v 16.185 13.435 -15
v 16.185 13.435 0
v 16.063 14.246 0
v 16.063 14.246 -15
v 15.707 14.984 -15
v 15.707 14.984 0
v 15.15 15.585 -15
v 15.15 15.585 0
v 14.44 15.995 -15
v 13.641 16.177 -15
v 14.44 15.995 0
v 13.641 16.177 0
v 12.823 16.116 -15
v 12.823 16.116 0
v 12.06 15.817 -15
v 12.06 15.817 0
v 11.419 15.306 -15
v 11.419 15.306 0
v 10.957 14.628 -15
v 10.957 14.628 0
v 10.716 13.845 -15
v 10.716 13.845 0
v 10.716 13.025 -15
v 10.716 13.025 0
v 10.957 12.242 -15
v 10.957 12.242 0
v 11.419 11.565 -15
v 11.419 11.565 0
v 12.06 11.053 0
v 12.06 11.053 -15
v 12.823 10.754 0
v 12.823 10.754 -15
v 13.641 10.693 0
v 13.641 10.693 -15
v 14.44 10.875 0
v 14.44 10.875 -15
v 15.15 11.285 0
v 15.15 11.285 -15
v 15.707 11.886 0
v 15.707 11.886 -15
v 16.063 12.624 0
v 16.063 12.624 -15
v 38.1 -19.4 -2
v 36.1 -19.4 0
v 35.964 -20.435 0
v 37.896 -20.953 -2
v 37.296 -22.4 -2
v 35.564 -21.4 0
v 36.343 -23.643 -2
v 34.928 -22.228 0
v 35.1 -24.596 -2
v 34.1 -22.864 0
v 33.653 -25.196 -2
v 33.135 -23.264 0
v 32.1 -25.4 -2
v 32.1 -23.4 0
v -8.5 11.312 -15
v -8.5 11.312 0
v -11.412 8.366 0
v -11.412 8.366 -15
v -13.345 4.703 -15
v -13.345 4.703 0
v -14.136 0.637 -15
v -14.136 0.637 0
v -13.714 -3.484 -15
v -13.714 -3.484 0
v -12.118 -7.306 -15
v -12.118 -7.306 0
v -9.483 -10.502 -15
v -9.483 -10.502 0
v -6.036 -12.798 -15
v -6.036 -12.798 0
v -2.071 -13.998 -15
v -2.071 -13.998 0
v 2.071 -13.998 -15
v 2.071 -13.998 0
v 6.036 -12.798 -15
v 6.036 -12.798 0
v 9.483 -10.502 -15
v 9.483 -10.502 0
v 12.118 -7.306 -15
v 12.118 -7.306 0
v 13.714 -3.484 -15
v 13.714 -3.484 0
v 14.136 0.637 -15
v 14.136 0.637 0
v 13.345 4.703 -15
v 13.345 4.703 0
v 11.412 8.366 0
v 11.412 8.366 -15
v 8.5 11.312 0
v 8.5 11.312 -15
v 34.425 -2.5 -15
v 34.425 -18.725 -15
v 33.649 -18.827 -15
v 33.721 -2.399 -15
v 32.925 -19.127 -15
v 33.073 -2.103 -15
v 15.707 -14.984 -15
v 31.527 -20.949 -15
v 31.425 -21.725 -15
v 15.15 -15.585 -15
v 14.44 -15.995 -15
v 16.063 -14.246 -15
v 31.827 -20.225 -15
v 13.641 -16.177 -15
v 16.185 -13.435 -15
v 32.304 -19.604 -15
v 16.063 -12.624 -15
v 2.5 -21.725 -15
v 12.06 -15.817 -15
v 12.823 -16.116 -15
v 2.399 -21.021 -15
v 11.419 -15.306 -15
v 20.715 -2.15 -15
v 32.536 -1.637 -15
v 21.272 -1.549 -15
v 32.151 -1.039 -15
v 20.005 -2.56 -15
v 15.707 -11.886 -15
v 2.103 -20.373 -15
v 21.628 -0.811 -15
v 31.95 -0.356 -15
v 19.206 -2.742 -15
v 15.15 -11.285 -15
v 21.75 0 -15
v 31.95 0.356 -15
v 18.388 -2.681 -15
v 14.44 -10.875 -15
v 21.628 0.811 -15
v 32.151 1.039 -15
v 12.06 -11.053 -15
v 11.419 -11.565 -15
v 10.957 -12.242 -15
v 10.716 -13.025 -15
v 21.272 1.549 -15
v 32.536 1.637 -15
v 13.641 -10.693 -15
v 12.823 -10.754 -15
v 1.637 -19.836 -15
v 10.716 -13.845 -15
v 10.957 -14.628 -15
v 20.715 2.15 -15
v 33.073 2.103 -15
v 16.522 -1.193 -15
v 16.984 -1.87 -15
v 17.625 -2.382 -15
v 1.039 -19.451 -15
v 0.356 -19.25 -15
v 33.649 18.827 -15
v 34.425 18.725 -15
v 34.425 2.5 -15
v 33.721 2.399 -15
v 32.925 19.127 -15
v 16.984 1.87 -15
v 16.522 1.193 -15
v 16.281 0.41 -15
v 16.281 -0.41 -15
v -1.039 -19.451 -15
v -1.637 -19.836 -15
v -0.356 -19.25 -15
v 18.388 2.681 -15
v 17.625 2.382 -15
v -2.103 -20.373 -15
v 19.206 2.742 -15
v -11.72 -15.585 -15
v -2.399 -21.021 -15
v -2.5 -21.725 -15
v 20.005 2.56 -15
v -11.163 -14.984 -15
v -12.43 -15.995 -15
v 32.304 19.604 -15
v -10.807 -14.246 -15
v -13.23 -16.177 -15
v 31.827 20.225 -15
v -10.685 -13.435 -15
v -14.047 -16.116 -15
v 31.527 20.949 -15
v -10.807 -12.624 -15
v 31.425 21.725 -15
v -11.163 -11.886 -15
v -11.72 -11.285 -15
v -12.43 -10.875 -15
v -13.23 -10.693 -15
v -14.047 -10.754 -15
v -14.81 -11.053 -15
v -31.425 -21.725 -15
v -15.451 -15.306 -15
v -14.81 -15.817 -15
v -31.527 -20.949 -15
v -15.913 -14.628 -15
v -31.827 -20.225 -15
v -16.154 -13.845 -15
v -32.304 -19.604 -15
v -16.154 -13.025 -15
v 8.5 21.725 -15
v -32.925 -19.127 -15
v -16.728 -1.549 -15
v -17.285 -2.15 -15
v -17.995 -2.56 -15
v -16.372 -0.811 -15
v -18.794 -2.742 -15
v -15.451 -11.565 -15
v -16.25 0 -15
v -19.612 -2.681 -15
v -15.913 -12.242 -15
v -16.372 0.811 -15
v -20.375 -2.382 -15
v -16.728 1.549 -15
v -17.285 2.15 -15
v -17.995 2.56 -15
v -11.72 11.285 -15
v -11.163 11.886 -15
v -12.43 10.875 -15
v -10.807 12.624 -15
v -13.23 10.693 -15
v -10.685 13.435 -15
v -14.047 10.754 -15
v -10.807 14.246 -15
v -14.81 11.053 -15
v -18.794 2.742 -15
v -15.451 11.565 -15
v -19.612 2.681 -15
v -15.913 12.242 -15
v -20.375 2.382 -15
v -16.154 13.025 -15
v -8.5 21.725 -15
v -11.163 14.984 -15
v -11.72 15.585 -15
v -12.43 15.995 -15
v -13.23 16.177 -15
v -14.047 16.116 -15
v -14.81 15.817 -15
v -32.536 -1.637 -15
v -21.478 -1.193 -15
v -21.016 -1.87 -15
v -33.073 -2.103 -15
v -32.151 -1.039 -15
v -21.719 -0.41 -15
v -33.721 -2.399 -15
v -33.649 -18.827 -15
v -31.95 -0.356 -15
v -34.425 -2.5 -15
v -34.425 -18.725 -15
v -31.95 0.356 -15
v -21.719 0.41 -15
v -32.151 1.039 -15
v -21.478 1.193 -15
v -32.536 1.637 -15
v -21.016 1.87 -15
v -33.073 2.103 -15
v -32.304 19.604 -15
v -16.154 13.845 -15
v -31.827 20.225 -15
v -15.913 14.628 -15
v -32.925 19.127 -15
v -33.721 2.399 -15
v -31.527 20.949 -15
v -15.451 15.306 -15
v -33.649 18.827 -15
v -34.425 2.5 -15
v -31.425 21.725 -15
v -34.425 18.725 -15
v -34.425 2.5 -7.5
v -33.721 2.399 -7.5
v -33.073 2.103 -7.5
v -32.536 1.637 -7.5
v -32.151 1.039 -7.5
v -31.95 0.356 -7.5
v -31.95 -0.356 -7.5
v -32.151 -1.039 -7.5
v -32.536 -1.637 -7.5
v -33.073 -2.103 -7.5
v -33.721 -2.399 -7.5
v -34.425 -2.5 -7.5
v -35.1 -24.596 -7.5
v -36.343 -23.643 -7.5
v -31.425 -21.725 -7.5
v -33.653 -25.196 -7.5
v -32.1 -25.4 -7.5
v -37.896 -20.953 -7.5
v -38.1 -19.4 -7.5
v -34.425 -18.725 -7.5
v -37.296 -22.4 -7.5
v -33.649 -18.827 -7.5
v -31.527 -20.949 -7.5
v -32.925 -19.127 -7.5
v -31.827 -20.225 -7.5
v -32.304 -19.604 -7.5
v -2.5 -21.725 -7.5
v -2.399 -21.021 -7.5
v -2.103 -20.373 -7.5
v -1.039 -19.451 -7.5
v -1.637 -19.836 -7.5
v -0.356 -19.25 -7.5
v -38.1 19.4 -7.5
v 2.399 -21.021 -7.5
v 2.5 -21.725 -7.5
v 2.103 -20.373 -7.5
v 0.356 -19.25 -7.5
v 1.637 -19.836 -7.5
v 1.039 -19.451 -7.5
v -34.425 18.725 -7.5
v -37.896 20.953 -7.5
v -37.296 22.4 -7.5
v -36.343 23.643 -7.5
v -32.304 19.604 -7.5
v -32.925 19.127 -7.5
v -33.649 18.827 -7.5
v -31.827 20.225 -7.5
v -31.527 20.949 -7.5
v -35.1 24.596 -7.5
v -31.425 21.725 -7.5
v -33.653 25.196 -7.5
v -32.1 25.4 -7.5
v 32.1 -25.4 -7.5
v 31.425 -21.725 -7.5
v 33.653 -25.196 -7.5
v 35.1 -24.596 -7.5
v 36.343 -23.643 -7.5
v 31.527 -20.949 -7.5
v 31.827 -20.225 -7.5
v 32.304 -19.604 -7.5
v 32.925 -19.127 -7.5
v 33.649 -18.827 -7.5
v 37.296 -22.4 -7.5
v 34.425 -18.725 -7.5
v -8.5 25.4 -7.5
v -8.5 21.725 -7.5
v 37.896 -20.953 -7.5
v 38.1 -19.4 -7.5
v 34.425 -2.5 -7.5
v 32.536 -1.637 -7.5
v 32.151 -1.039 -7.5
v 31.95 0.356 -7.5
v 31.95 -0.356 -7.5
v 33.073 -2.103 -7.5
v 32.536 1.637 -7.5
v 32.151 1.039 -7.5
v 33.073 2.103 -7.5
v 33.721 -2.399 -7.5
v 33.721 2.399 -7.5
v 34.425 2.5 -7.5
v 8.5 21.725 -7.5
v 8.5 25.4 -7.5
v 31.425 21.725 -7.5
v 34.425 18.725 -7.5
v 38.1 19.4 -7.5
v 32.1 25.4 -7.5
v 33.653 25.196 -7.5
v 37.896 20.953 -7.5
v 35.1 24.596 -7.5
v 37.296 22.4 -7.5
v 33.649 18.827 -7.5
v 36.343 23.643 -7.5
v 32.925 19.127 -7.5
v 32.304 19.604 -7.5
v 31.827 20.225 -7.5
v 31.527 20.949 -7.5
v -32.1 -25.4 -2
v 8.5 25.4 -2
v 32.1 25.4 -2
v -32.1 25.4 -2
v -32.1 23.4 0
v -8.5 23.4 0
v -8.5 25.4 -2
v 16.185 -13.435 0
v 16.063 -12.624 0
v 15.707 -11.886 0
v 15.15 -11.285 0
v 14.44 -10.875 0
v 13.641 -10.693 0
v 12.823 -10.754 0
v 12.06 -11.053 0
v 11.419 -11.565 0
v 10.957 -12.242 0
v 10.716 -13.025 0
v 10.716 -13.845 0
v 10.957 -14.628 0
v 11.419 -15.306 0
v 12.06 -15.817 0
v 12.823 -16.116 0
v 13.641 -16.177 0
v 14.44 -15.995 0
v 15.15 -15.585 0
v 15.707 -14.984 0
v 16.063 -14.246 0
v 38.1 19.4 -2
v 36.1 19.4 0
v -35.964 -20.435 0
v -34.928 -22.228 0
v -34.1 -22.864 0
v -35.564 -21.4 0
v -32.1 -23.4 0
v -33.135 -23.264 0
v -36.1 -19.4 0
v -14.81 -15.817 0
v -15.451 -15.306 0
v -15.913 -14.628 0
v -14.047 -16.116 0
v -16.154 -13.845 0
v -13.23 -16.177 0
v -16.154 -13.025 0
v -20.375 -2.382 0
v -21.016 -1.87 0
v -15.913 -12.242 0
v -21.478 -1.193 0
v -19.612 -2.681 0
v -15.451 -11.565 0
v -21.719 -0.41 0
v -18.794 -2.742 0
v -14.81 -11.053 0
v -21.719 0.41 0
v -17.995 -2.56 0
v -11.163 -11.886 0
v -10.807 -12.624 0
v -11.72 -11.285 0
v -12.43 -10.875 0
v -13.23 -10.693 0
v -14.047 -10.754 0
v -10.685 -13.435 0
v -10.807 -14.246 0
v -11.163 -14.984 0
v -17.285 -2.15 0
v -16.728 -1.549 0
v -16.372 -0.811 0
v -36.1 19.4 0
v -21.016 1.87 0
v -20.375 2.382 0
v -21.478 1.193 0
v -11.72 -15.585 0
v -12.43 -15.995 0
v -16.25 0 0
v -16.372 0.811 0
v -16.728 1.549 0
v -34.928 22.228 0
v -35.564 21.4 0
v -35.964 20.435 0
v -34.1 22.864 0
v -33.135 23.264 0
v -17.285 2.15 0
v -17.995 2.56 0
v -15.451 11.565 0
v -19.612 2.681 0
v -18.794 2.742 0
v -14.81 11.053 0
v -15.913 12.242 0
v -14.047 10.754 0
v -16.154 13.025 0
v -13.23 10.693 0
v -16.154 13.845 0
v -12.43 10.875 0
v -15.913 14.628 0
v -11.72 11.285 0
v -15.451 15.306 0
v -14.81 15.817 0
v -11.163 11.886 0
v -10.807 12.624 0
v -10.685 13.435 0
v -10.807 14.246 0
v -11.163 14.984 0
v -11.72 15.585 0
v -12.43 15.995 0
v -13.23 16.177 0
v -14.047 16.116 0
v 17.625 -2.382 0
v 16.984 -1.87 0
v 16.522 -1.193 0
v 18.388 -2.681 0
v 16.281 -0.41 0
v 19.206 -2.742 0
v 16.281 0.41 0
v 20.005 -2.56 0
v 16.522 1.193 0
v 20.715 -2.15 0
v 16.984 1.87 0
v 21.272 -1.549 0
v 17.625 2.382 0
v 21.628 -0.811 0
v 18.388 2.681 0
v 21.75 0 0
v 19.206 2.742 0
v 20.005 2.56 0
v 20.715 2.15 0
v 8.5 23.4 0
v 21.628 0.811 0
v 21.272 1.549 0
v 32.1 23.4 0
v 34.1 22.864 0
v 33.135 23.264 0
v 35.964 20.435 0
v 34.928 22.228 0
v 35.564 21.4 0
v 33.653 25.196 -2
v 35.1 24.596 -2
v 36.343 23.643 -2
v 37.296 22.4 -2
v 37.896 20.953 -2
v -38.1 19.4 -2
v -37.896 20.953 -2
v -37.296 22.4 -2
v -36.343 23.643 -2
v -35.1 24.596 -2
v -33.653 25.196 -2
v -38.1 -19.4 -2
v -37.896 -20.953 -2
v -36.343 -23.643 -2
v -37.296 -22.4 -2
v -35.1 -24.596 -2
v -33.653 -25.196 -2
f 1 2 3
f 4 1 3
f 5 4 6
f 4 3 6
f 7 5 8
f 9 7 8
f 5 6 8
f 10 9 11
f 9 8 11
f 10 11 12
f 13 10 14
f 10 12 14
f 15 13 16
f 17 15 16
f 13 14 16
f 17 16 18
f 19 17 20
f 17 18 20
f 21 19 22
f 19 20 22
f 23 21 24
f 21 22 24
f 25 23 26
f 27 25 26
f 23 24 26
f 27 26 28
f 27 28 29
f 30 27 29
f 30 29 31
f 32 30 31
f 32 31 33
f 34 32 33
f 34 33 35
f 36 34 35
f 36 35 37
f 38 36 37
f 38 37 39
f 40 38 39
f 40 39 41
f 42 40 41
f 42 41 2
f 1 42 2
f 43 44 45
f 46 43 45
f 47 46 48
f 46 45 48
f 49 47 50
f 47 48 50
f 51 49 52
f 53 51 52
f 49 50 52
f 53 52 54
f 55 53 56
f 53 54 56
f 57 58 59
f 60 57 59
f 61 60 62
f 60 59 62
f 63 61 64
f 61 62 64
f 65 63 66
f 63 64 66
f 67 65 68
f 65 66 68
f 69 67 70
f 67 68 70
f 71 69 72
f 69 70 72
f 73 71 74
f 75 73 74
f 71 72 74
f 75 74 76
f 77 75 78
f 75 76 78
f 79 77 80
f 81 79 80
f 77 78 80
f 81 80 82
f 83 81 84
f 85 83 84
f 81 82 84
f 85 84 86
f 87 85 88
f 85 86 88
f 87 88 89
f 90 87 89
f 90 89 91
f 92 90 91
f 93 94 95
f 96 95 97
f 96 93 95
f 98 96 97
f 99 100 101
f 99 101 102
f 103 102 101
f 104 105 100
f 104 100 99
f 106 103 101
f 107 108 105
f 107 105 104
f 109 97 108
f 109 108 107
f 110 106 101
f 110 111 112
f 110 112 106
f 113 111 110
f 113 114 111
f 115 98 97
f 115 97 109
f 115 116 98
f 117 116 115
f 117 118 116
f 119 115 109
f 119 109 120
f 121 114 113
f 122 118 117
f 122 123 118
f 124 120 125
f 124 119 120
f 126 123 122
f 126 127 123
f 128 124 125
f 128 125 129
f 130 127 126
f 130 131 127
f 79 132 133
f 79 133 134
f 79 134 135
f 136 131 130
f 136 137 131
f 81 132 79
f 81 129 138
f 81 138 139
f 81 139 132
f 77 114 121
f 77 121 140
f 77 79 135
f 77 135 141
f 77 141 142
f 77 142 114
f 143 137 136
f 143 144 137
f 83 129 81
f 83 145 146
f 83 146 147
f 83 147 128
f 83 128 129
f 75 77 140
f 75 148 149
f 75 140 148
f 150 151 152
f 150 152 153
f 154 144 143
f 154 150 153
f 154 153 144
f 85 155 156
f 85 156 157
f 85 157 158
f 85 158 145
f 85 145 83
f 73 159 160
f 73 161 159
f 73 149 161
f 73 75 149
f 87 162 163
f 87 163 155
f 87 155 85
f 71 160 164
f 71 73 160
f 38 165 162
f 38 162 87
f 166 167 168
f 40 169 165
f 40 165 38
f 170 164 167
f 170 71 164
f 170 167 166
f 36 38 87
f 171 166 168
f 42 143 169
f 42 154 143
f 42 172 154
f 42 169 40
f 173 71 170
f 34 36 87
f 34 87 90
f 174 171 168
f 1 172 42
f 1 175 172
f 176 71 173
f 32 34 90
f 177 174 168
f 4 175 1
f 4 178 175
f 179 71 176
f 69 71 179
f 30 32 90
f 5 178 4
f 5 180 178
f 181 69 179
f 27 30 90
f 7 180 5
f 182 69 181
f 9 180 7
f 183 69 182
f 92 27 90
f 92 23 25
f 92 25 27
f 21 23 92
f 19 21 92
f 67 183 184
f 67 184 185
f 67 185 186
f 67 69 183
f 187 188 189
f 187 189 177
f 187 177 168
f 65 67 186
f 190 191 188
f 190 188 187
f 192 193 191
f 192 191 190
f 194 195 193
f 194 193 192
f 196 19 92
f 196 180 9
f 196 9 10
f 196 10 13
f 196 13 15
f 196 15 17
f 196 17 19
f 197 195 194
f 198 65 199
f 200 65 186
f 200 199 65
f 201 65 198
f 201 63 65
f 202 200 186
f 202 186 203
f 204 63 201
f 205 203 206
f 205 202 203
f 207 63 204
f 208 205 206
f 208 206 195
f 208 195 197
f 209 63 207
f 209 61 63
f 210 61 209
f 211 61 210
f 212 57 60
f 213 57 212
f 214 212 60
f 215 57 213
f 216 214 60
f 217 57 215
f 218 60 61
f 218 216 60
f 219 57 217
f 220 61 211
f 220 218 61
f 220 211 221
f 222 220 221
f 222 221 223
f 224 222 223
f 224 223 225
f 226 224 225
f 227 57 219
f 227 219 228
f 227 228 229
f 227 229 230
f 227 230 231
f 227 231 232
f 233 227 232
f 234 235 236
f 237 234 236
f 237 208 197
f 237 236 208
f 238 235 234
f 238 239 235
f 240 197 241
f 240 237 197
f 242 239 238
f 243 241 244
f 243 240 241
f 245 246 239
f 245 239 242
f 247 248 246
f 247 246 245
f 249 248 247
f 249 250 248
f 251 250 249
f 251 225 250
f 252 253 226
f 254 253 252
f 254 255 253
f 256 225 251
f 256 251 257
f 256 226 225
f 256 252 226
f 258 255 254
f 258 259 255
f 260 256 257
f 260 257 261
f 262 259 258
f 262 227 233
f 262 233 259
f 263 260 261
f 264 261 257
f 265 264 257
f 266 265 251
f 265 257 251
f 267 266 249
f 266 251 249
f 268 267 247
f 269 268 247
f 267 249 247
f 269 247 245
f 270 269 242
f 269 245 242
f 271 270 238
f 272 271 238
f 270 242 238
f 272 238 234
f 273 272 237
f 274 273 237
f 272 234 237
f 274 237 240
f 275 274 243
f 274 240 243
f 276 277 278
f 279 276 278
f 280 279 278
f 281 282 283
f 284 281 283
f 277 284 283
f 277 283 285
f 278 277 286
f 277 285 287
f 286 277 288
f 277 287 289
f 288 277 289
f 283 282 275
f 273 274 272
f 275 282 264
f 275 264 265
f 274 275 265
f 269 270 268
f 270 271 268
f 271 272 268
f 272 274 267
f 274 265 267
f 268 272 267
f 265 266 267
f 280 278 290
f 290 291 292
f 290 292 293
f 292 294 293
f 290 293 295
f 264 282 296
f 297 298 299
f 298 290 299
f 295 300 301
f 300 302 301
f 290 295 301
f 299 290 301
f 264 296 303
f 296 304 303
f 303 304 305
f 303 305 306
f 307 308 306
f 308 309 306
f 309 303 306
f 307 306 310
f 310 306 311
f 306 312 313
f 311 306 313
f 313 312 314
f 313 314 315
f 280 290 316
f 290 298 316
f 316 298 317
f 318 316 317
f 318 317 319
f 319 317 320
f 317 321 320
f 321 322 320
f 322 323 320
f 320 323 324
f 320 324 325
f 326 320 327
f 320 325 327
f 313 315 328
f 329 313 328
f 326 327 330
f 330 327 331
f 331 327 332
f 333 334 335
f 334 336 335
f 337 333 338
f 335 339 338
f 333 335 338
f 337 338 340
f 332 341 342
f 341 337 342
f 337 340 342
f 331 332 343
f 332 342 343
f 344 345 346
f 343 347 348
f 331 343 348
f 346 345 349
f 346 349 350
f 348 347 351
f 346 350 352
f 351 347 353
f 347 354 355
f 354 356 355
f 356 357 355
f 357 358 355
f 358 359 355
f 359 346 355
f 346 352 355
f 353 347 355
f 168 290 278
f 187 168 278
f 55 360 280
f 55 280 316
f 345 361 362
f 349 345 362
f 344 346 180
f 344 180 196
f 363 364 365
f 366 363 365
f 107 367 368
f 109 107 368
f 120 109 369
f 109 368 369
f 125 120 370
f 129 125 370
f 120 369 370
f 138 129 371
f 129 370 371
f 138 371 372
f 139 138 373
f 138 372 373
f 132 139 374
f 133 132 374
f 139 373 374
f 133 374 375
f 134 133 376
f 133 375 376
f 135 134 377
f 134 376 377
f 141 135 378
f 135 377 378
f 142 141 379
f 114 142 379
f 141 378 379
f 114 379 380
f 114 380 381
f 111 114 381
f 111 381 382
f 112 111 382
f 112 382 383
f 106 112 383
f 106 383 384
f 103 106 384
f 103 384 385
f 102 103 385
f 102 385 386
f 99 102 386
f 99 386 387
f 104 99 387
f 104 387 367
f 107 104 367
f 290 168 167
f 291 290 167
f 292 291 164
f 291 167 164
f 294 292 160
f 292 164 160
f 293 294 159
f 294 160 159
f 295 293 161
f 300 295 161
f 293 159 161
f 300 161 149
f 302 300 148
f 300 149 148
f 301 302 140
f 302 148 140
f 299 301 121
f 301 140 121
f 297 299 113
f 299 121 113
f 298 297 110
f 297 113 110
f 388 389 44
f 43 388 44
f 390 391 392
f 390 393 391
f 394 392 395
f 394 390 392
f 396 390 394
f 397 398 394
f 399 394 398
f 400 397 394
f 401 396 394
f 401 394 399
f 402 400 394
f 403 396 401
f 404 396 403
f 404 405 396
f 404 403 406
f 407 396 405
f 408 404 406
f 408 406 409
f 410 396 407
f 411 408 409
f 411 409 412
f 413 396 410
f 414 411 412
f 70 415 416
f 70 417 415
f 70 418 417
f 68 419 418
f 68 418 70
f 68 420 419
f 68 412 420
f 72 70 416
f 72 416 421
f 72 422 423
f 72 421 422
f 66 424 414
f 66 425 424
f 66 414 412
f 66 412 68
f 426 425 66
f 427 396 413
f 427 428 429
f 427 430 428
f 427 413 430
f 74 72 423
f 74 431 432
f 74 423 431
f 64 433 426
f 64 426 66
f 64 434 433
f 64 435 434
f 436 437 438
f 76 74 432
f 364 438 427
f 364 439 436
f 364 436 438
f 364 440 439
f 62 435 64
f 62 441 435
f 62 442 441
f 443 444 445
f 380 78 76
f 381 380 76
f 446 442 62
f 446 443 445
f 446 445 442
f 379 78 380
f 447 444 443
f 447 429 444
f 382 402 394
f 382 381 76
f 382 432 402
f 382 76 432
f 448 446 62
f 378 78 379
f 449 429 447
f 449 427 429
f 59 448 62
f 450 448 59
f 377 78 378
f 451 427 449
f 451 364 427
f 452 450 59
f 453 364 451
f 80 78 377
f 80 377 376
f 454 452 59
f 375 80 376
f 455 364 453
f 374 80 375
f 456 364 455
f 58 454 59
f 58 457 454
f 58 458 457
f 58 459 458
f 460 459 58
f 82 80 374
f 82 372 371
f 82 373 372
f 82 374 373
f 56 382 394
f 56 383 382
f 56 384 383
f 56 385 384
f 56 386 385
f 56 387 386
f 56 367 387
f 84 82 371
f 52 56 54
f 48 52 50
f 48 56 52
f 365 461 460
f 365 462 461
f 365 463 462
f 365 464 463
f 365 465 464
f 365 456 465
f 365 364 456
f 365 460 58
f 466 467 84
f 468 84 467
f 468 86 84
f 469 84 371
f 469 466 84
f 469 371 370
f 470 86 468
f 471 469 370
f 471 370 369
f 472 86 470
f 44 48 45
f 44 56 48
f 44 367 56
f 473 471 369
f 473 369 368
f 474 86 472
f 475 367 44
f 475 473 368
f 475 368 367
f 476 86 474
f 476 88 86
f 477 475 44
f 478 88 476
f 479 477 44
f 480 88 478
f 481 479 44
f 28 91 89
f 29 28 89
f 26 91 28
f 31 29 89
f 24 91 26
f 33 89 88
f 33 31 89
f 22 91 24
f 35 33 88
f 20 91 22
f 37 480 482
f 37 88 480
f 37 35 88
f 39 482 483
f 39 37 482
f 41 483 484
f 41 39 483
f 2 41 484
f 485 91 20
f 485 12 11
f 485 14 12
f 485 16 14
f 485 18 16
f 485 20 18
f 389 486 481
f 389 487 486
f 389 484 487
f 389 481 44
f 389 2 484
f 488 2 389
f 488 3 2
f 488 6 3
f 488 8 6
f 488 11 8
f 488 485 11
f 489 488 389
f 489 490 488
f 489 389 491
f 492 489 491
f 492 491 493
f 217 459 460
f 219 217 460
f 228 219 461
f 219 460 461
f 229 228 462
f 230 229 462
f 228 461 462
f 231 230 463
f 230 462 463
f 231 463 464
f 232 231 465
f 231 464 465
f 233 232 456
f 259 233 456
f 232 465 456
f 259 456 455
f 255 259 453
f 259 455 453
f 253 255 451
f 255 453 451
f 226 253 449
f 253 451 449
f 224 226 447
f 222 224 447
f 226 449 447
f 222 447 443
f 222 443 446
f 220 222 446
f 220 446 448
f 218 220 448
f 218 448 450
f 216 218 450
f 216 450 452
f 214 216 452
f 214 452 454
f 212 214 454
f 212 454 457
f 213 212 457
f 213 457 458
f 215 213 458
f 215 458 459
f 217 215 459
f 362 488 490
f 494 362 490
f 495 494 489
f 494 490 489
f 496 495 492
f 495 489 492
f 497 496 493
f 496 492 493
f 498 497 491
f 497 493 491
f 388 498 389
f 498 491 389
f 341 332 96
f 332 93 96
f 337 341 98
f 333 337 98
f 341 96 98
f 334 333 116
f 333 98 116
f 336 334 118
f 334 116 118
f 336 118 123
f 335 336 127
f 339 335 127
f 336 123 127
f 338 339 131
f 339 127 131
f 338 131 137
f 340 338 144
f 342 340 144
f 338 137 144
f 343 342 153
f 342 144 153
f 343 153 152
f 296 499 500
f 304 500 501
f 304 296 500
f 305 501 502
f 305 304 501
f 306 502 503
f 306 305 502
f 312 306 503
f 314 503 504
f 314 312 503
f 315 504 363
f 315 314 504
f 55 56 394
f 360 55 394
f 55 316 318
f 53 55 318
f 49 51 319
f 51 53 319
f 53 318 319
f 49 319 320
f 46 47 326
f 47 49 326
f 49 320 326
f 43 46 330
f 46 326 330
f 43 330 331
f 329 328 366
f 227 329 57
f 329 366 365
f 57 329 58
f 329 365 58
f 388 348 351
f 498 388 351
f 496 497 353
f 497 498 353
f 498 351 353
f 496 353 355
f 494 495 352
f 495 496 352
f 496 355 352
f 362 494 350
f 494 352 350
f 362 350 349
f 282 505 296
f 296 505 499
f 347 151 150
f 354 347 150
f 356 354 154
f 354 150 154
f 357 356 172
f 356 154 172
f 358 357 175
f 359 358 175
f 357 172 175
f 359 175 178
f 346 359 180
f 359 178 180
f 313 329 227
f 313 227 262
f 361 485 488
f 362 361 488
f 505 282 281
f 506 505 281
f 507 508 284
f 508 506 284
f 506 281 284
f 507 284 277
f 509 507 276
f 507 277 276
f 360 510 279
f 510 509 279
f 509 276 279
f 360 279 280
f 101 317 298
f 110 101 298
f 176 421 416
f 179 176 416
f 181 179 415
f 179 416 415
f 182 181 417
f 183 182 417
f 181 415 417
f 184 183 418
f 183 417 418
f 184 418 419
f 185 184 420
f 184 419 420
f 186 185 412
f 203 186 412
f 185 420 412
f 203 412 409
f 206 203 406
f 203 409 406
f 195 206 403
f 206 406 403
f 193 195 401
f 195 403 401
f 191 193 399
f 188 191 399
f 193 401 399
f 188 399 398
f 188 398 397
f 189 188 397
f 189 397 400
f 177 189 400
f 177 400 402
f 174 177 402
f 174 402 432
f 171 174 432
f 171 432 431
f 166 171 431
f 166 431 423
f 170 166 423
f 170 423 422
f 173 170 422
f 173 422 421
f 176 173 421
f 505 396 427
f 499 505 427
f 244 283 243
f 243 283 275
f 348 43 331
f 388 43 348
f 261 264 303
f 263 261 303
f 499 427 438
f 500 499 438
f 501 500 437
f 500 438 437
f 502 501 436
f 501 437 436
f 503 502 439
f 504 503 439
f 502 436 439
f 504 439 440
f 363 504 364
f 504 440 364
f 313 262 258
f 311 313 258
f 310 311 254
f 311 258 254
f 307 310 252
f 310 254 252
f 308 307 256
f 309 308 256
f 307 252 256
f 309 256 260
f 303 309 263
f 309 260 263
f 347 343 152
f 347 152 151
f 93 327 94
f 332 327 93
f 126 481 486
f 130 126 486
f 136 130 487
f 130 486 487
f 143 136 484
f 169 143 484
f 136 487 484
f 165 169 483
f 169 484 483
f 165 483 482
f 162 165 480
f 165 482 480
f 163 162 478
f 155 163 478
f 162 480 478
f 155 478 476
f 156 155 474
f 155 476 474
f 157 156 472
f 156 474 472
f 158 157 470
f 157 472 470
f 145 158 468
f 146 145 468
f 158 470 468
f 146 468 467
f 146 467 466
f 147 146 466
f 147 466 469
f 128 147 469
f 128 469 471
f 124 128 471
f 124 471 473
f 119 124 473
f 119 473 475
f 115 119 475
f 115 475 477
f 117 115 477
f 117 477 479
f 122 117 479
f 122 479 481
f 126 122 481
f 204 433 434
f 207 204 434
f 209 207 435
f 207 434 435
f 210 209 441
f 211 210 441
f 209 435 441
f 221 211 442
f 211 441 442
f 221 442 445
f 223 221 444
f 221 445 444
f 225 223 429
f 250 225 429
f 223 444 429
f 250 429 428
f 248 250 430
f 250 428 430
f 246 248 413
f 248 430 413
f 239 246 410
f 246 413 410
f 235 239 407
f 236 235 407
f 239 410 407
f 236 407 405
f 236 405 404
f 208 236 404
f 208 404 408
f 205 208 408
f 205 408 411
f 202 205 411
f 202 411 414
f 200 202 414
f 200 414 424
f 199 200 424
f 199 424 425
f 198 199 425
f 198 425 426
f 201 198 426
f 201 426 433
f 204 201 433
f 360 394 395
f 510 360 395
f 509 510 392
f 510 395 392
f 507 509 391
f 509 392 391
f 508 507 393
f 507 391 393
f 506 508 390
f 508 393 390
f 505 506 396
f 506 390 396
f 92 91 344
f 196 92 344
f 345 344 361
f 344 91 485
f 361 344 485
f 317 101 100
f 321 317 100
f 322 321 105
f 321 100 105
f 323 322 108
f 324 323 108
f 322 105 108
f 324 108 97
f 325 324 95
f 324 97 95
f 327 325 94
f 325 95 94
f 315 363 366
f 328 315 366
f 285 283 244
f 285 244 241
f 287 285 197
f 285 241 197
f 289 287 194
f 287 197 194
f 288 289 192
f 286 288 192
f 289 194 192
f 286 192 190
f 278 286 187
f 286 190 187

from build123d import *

# Parameters (mm, degrees)
SKETCH1_W           = 76.2
SKETCH1_H           = 50.8
BOSS_EXTRUDE1_DEPTH = 7.5
SKETCH2_W           = 68.85
SKETCH2_H           = 43.45
BOSS_EXTRUDE2_DEPTH = 7.5
SKETCH3_R           = 2.75
CUT_EXTRUDE1_DEPTH  = 49.184748624
FILLET1_R           = 6
SKETCH4_R           = 3
SKETCH4_R_2         = 2.5
CUT_EXTRUDE2_DEPTH  = 7.5
CHAMFER1_SIZE       = 2


with BuildPart() as part:
    # Sketch1 → Boss-Extrude1 (new body)
    with BuildSketch(Plane.XY):
        Rectangle(SKETCH1_W, SKETCH1_H)
    extrude(amount=-BOSS_EXTRUDE1_DEPTH)

    # Sketch2 → Boss-Extrude2 (add)
    with BuildSketch(Plane(origin=(0, 0, -7.5), x_dir=(-1, 0, 0), z_dir=(0, 0, -1))):
        Rectangle(SKETCH2_W, SKETCH2_H)
    extrude(amount=BOSS_EXTRUDE2_DEPTH)

    # Sketch3 → Cut-Extrude1 (cut, through all)
    with BuildSketch(Plane.XY):
        with Locations((-19, 0)):
            Circle(SKETCH3_R)
        with Locations((-13.435028843, 13.435028843)):
            Circle(SKETCH3_R)
        with Locations((13.435028843, 13.435028843)):
            Circle(SKETCH3_R)
        with Locations((19, 0)):
            Circle(SKETCH3_R)
        with Locations((13.435028843, -13.435028843)):
            Circle(SKETCH3_R)
        with Locations((-13.435028843, -13.435028843)):
            Circle(SKETCH3_R)
        with BuildLine():
            Line((8.5, 11.312493094), (8.5, 25.4))
            Line((8.5, 25.4), (-8.5, 25.4))
            Line((-8.5, 25.4), (-8.5, 11.312493094))
            ThreePointArc((-8.5, 11.312493094), (0, -14.15), (8.5, 11.312493094))
        make_face()
    extrude(amount=-CUT_EXTRUDE1_DEPTH, mode=Mode.SUBTRACT)

    # Fillet1
    fillet1_edges = [part.edges().sort_by_distance(p)[0] for p in [
        (-38.1, 25.4, -3.75),
        (38.1, 25.4, -3.75),
        (38.1, -25.4, -3.75),
        (-38.1, -25.4, -3.75),
    ]]
    fillet(fillet1_edges, radius=FILLET1_R)

    # Sketch4 → Cut-Extrude2 (cut)
    with BuildSketch(Plane(origin=(0, 0, -15), x_dir=(-1, 0, 0), z_dir=(0, 0, -1))):
        with Locations((-34.425, 21.725)):
            Circle(SKETCH4_R)
        with Locations((-34.425, -21.725)):
            Circle(SKETCH4_R)
        with Locations((-34.425, 0)):
            Circle(SKETCH4_R_2)
        with Locations((0, -21.725)):
            Circle(SKETCH4_R_2)
        with Locations((34.425, -21.725)):
            Circle(SKETCH4_R)
        with Locations((34.425, 0)):
            Circle(SKETCH4_R_2)
        with Locations((34.425, 21.725)):
            Circle(SKETCH4_R)
    extrude(amount=-CUT_EXTRUDE2_DEPTH, mode=Mode.SUBTRACT)

    # Chamfer1
    chamfer1_edges = [part.edges().sort_by_distance(p)[0] for p in [
        (-20.3, 25.4, 0),
        (0, -25.4, 0),
        (-38.1, 0, 0),
        (38.1, 0, 0),
        (20.3, 25.4, 0),
        (36.342640687, 23.642640687, 0),
        (-36.342640687, 23.642640687, 0),
        (-36.342640687, -23.642640687, 0),
        (36.342640687, -23.642640687, 0),
    ]]
    chamfer(chamfer1_edges, length=CHAMFER1_SIZE)


solid = part.part
